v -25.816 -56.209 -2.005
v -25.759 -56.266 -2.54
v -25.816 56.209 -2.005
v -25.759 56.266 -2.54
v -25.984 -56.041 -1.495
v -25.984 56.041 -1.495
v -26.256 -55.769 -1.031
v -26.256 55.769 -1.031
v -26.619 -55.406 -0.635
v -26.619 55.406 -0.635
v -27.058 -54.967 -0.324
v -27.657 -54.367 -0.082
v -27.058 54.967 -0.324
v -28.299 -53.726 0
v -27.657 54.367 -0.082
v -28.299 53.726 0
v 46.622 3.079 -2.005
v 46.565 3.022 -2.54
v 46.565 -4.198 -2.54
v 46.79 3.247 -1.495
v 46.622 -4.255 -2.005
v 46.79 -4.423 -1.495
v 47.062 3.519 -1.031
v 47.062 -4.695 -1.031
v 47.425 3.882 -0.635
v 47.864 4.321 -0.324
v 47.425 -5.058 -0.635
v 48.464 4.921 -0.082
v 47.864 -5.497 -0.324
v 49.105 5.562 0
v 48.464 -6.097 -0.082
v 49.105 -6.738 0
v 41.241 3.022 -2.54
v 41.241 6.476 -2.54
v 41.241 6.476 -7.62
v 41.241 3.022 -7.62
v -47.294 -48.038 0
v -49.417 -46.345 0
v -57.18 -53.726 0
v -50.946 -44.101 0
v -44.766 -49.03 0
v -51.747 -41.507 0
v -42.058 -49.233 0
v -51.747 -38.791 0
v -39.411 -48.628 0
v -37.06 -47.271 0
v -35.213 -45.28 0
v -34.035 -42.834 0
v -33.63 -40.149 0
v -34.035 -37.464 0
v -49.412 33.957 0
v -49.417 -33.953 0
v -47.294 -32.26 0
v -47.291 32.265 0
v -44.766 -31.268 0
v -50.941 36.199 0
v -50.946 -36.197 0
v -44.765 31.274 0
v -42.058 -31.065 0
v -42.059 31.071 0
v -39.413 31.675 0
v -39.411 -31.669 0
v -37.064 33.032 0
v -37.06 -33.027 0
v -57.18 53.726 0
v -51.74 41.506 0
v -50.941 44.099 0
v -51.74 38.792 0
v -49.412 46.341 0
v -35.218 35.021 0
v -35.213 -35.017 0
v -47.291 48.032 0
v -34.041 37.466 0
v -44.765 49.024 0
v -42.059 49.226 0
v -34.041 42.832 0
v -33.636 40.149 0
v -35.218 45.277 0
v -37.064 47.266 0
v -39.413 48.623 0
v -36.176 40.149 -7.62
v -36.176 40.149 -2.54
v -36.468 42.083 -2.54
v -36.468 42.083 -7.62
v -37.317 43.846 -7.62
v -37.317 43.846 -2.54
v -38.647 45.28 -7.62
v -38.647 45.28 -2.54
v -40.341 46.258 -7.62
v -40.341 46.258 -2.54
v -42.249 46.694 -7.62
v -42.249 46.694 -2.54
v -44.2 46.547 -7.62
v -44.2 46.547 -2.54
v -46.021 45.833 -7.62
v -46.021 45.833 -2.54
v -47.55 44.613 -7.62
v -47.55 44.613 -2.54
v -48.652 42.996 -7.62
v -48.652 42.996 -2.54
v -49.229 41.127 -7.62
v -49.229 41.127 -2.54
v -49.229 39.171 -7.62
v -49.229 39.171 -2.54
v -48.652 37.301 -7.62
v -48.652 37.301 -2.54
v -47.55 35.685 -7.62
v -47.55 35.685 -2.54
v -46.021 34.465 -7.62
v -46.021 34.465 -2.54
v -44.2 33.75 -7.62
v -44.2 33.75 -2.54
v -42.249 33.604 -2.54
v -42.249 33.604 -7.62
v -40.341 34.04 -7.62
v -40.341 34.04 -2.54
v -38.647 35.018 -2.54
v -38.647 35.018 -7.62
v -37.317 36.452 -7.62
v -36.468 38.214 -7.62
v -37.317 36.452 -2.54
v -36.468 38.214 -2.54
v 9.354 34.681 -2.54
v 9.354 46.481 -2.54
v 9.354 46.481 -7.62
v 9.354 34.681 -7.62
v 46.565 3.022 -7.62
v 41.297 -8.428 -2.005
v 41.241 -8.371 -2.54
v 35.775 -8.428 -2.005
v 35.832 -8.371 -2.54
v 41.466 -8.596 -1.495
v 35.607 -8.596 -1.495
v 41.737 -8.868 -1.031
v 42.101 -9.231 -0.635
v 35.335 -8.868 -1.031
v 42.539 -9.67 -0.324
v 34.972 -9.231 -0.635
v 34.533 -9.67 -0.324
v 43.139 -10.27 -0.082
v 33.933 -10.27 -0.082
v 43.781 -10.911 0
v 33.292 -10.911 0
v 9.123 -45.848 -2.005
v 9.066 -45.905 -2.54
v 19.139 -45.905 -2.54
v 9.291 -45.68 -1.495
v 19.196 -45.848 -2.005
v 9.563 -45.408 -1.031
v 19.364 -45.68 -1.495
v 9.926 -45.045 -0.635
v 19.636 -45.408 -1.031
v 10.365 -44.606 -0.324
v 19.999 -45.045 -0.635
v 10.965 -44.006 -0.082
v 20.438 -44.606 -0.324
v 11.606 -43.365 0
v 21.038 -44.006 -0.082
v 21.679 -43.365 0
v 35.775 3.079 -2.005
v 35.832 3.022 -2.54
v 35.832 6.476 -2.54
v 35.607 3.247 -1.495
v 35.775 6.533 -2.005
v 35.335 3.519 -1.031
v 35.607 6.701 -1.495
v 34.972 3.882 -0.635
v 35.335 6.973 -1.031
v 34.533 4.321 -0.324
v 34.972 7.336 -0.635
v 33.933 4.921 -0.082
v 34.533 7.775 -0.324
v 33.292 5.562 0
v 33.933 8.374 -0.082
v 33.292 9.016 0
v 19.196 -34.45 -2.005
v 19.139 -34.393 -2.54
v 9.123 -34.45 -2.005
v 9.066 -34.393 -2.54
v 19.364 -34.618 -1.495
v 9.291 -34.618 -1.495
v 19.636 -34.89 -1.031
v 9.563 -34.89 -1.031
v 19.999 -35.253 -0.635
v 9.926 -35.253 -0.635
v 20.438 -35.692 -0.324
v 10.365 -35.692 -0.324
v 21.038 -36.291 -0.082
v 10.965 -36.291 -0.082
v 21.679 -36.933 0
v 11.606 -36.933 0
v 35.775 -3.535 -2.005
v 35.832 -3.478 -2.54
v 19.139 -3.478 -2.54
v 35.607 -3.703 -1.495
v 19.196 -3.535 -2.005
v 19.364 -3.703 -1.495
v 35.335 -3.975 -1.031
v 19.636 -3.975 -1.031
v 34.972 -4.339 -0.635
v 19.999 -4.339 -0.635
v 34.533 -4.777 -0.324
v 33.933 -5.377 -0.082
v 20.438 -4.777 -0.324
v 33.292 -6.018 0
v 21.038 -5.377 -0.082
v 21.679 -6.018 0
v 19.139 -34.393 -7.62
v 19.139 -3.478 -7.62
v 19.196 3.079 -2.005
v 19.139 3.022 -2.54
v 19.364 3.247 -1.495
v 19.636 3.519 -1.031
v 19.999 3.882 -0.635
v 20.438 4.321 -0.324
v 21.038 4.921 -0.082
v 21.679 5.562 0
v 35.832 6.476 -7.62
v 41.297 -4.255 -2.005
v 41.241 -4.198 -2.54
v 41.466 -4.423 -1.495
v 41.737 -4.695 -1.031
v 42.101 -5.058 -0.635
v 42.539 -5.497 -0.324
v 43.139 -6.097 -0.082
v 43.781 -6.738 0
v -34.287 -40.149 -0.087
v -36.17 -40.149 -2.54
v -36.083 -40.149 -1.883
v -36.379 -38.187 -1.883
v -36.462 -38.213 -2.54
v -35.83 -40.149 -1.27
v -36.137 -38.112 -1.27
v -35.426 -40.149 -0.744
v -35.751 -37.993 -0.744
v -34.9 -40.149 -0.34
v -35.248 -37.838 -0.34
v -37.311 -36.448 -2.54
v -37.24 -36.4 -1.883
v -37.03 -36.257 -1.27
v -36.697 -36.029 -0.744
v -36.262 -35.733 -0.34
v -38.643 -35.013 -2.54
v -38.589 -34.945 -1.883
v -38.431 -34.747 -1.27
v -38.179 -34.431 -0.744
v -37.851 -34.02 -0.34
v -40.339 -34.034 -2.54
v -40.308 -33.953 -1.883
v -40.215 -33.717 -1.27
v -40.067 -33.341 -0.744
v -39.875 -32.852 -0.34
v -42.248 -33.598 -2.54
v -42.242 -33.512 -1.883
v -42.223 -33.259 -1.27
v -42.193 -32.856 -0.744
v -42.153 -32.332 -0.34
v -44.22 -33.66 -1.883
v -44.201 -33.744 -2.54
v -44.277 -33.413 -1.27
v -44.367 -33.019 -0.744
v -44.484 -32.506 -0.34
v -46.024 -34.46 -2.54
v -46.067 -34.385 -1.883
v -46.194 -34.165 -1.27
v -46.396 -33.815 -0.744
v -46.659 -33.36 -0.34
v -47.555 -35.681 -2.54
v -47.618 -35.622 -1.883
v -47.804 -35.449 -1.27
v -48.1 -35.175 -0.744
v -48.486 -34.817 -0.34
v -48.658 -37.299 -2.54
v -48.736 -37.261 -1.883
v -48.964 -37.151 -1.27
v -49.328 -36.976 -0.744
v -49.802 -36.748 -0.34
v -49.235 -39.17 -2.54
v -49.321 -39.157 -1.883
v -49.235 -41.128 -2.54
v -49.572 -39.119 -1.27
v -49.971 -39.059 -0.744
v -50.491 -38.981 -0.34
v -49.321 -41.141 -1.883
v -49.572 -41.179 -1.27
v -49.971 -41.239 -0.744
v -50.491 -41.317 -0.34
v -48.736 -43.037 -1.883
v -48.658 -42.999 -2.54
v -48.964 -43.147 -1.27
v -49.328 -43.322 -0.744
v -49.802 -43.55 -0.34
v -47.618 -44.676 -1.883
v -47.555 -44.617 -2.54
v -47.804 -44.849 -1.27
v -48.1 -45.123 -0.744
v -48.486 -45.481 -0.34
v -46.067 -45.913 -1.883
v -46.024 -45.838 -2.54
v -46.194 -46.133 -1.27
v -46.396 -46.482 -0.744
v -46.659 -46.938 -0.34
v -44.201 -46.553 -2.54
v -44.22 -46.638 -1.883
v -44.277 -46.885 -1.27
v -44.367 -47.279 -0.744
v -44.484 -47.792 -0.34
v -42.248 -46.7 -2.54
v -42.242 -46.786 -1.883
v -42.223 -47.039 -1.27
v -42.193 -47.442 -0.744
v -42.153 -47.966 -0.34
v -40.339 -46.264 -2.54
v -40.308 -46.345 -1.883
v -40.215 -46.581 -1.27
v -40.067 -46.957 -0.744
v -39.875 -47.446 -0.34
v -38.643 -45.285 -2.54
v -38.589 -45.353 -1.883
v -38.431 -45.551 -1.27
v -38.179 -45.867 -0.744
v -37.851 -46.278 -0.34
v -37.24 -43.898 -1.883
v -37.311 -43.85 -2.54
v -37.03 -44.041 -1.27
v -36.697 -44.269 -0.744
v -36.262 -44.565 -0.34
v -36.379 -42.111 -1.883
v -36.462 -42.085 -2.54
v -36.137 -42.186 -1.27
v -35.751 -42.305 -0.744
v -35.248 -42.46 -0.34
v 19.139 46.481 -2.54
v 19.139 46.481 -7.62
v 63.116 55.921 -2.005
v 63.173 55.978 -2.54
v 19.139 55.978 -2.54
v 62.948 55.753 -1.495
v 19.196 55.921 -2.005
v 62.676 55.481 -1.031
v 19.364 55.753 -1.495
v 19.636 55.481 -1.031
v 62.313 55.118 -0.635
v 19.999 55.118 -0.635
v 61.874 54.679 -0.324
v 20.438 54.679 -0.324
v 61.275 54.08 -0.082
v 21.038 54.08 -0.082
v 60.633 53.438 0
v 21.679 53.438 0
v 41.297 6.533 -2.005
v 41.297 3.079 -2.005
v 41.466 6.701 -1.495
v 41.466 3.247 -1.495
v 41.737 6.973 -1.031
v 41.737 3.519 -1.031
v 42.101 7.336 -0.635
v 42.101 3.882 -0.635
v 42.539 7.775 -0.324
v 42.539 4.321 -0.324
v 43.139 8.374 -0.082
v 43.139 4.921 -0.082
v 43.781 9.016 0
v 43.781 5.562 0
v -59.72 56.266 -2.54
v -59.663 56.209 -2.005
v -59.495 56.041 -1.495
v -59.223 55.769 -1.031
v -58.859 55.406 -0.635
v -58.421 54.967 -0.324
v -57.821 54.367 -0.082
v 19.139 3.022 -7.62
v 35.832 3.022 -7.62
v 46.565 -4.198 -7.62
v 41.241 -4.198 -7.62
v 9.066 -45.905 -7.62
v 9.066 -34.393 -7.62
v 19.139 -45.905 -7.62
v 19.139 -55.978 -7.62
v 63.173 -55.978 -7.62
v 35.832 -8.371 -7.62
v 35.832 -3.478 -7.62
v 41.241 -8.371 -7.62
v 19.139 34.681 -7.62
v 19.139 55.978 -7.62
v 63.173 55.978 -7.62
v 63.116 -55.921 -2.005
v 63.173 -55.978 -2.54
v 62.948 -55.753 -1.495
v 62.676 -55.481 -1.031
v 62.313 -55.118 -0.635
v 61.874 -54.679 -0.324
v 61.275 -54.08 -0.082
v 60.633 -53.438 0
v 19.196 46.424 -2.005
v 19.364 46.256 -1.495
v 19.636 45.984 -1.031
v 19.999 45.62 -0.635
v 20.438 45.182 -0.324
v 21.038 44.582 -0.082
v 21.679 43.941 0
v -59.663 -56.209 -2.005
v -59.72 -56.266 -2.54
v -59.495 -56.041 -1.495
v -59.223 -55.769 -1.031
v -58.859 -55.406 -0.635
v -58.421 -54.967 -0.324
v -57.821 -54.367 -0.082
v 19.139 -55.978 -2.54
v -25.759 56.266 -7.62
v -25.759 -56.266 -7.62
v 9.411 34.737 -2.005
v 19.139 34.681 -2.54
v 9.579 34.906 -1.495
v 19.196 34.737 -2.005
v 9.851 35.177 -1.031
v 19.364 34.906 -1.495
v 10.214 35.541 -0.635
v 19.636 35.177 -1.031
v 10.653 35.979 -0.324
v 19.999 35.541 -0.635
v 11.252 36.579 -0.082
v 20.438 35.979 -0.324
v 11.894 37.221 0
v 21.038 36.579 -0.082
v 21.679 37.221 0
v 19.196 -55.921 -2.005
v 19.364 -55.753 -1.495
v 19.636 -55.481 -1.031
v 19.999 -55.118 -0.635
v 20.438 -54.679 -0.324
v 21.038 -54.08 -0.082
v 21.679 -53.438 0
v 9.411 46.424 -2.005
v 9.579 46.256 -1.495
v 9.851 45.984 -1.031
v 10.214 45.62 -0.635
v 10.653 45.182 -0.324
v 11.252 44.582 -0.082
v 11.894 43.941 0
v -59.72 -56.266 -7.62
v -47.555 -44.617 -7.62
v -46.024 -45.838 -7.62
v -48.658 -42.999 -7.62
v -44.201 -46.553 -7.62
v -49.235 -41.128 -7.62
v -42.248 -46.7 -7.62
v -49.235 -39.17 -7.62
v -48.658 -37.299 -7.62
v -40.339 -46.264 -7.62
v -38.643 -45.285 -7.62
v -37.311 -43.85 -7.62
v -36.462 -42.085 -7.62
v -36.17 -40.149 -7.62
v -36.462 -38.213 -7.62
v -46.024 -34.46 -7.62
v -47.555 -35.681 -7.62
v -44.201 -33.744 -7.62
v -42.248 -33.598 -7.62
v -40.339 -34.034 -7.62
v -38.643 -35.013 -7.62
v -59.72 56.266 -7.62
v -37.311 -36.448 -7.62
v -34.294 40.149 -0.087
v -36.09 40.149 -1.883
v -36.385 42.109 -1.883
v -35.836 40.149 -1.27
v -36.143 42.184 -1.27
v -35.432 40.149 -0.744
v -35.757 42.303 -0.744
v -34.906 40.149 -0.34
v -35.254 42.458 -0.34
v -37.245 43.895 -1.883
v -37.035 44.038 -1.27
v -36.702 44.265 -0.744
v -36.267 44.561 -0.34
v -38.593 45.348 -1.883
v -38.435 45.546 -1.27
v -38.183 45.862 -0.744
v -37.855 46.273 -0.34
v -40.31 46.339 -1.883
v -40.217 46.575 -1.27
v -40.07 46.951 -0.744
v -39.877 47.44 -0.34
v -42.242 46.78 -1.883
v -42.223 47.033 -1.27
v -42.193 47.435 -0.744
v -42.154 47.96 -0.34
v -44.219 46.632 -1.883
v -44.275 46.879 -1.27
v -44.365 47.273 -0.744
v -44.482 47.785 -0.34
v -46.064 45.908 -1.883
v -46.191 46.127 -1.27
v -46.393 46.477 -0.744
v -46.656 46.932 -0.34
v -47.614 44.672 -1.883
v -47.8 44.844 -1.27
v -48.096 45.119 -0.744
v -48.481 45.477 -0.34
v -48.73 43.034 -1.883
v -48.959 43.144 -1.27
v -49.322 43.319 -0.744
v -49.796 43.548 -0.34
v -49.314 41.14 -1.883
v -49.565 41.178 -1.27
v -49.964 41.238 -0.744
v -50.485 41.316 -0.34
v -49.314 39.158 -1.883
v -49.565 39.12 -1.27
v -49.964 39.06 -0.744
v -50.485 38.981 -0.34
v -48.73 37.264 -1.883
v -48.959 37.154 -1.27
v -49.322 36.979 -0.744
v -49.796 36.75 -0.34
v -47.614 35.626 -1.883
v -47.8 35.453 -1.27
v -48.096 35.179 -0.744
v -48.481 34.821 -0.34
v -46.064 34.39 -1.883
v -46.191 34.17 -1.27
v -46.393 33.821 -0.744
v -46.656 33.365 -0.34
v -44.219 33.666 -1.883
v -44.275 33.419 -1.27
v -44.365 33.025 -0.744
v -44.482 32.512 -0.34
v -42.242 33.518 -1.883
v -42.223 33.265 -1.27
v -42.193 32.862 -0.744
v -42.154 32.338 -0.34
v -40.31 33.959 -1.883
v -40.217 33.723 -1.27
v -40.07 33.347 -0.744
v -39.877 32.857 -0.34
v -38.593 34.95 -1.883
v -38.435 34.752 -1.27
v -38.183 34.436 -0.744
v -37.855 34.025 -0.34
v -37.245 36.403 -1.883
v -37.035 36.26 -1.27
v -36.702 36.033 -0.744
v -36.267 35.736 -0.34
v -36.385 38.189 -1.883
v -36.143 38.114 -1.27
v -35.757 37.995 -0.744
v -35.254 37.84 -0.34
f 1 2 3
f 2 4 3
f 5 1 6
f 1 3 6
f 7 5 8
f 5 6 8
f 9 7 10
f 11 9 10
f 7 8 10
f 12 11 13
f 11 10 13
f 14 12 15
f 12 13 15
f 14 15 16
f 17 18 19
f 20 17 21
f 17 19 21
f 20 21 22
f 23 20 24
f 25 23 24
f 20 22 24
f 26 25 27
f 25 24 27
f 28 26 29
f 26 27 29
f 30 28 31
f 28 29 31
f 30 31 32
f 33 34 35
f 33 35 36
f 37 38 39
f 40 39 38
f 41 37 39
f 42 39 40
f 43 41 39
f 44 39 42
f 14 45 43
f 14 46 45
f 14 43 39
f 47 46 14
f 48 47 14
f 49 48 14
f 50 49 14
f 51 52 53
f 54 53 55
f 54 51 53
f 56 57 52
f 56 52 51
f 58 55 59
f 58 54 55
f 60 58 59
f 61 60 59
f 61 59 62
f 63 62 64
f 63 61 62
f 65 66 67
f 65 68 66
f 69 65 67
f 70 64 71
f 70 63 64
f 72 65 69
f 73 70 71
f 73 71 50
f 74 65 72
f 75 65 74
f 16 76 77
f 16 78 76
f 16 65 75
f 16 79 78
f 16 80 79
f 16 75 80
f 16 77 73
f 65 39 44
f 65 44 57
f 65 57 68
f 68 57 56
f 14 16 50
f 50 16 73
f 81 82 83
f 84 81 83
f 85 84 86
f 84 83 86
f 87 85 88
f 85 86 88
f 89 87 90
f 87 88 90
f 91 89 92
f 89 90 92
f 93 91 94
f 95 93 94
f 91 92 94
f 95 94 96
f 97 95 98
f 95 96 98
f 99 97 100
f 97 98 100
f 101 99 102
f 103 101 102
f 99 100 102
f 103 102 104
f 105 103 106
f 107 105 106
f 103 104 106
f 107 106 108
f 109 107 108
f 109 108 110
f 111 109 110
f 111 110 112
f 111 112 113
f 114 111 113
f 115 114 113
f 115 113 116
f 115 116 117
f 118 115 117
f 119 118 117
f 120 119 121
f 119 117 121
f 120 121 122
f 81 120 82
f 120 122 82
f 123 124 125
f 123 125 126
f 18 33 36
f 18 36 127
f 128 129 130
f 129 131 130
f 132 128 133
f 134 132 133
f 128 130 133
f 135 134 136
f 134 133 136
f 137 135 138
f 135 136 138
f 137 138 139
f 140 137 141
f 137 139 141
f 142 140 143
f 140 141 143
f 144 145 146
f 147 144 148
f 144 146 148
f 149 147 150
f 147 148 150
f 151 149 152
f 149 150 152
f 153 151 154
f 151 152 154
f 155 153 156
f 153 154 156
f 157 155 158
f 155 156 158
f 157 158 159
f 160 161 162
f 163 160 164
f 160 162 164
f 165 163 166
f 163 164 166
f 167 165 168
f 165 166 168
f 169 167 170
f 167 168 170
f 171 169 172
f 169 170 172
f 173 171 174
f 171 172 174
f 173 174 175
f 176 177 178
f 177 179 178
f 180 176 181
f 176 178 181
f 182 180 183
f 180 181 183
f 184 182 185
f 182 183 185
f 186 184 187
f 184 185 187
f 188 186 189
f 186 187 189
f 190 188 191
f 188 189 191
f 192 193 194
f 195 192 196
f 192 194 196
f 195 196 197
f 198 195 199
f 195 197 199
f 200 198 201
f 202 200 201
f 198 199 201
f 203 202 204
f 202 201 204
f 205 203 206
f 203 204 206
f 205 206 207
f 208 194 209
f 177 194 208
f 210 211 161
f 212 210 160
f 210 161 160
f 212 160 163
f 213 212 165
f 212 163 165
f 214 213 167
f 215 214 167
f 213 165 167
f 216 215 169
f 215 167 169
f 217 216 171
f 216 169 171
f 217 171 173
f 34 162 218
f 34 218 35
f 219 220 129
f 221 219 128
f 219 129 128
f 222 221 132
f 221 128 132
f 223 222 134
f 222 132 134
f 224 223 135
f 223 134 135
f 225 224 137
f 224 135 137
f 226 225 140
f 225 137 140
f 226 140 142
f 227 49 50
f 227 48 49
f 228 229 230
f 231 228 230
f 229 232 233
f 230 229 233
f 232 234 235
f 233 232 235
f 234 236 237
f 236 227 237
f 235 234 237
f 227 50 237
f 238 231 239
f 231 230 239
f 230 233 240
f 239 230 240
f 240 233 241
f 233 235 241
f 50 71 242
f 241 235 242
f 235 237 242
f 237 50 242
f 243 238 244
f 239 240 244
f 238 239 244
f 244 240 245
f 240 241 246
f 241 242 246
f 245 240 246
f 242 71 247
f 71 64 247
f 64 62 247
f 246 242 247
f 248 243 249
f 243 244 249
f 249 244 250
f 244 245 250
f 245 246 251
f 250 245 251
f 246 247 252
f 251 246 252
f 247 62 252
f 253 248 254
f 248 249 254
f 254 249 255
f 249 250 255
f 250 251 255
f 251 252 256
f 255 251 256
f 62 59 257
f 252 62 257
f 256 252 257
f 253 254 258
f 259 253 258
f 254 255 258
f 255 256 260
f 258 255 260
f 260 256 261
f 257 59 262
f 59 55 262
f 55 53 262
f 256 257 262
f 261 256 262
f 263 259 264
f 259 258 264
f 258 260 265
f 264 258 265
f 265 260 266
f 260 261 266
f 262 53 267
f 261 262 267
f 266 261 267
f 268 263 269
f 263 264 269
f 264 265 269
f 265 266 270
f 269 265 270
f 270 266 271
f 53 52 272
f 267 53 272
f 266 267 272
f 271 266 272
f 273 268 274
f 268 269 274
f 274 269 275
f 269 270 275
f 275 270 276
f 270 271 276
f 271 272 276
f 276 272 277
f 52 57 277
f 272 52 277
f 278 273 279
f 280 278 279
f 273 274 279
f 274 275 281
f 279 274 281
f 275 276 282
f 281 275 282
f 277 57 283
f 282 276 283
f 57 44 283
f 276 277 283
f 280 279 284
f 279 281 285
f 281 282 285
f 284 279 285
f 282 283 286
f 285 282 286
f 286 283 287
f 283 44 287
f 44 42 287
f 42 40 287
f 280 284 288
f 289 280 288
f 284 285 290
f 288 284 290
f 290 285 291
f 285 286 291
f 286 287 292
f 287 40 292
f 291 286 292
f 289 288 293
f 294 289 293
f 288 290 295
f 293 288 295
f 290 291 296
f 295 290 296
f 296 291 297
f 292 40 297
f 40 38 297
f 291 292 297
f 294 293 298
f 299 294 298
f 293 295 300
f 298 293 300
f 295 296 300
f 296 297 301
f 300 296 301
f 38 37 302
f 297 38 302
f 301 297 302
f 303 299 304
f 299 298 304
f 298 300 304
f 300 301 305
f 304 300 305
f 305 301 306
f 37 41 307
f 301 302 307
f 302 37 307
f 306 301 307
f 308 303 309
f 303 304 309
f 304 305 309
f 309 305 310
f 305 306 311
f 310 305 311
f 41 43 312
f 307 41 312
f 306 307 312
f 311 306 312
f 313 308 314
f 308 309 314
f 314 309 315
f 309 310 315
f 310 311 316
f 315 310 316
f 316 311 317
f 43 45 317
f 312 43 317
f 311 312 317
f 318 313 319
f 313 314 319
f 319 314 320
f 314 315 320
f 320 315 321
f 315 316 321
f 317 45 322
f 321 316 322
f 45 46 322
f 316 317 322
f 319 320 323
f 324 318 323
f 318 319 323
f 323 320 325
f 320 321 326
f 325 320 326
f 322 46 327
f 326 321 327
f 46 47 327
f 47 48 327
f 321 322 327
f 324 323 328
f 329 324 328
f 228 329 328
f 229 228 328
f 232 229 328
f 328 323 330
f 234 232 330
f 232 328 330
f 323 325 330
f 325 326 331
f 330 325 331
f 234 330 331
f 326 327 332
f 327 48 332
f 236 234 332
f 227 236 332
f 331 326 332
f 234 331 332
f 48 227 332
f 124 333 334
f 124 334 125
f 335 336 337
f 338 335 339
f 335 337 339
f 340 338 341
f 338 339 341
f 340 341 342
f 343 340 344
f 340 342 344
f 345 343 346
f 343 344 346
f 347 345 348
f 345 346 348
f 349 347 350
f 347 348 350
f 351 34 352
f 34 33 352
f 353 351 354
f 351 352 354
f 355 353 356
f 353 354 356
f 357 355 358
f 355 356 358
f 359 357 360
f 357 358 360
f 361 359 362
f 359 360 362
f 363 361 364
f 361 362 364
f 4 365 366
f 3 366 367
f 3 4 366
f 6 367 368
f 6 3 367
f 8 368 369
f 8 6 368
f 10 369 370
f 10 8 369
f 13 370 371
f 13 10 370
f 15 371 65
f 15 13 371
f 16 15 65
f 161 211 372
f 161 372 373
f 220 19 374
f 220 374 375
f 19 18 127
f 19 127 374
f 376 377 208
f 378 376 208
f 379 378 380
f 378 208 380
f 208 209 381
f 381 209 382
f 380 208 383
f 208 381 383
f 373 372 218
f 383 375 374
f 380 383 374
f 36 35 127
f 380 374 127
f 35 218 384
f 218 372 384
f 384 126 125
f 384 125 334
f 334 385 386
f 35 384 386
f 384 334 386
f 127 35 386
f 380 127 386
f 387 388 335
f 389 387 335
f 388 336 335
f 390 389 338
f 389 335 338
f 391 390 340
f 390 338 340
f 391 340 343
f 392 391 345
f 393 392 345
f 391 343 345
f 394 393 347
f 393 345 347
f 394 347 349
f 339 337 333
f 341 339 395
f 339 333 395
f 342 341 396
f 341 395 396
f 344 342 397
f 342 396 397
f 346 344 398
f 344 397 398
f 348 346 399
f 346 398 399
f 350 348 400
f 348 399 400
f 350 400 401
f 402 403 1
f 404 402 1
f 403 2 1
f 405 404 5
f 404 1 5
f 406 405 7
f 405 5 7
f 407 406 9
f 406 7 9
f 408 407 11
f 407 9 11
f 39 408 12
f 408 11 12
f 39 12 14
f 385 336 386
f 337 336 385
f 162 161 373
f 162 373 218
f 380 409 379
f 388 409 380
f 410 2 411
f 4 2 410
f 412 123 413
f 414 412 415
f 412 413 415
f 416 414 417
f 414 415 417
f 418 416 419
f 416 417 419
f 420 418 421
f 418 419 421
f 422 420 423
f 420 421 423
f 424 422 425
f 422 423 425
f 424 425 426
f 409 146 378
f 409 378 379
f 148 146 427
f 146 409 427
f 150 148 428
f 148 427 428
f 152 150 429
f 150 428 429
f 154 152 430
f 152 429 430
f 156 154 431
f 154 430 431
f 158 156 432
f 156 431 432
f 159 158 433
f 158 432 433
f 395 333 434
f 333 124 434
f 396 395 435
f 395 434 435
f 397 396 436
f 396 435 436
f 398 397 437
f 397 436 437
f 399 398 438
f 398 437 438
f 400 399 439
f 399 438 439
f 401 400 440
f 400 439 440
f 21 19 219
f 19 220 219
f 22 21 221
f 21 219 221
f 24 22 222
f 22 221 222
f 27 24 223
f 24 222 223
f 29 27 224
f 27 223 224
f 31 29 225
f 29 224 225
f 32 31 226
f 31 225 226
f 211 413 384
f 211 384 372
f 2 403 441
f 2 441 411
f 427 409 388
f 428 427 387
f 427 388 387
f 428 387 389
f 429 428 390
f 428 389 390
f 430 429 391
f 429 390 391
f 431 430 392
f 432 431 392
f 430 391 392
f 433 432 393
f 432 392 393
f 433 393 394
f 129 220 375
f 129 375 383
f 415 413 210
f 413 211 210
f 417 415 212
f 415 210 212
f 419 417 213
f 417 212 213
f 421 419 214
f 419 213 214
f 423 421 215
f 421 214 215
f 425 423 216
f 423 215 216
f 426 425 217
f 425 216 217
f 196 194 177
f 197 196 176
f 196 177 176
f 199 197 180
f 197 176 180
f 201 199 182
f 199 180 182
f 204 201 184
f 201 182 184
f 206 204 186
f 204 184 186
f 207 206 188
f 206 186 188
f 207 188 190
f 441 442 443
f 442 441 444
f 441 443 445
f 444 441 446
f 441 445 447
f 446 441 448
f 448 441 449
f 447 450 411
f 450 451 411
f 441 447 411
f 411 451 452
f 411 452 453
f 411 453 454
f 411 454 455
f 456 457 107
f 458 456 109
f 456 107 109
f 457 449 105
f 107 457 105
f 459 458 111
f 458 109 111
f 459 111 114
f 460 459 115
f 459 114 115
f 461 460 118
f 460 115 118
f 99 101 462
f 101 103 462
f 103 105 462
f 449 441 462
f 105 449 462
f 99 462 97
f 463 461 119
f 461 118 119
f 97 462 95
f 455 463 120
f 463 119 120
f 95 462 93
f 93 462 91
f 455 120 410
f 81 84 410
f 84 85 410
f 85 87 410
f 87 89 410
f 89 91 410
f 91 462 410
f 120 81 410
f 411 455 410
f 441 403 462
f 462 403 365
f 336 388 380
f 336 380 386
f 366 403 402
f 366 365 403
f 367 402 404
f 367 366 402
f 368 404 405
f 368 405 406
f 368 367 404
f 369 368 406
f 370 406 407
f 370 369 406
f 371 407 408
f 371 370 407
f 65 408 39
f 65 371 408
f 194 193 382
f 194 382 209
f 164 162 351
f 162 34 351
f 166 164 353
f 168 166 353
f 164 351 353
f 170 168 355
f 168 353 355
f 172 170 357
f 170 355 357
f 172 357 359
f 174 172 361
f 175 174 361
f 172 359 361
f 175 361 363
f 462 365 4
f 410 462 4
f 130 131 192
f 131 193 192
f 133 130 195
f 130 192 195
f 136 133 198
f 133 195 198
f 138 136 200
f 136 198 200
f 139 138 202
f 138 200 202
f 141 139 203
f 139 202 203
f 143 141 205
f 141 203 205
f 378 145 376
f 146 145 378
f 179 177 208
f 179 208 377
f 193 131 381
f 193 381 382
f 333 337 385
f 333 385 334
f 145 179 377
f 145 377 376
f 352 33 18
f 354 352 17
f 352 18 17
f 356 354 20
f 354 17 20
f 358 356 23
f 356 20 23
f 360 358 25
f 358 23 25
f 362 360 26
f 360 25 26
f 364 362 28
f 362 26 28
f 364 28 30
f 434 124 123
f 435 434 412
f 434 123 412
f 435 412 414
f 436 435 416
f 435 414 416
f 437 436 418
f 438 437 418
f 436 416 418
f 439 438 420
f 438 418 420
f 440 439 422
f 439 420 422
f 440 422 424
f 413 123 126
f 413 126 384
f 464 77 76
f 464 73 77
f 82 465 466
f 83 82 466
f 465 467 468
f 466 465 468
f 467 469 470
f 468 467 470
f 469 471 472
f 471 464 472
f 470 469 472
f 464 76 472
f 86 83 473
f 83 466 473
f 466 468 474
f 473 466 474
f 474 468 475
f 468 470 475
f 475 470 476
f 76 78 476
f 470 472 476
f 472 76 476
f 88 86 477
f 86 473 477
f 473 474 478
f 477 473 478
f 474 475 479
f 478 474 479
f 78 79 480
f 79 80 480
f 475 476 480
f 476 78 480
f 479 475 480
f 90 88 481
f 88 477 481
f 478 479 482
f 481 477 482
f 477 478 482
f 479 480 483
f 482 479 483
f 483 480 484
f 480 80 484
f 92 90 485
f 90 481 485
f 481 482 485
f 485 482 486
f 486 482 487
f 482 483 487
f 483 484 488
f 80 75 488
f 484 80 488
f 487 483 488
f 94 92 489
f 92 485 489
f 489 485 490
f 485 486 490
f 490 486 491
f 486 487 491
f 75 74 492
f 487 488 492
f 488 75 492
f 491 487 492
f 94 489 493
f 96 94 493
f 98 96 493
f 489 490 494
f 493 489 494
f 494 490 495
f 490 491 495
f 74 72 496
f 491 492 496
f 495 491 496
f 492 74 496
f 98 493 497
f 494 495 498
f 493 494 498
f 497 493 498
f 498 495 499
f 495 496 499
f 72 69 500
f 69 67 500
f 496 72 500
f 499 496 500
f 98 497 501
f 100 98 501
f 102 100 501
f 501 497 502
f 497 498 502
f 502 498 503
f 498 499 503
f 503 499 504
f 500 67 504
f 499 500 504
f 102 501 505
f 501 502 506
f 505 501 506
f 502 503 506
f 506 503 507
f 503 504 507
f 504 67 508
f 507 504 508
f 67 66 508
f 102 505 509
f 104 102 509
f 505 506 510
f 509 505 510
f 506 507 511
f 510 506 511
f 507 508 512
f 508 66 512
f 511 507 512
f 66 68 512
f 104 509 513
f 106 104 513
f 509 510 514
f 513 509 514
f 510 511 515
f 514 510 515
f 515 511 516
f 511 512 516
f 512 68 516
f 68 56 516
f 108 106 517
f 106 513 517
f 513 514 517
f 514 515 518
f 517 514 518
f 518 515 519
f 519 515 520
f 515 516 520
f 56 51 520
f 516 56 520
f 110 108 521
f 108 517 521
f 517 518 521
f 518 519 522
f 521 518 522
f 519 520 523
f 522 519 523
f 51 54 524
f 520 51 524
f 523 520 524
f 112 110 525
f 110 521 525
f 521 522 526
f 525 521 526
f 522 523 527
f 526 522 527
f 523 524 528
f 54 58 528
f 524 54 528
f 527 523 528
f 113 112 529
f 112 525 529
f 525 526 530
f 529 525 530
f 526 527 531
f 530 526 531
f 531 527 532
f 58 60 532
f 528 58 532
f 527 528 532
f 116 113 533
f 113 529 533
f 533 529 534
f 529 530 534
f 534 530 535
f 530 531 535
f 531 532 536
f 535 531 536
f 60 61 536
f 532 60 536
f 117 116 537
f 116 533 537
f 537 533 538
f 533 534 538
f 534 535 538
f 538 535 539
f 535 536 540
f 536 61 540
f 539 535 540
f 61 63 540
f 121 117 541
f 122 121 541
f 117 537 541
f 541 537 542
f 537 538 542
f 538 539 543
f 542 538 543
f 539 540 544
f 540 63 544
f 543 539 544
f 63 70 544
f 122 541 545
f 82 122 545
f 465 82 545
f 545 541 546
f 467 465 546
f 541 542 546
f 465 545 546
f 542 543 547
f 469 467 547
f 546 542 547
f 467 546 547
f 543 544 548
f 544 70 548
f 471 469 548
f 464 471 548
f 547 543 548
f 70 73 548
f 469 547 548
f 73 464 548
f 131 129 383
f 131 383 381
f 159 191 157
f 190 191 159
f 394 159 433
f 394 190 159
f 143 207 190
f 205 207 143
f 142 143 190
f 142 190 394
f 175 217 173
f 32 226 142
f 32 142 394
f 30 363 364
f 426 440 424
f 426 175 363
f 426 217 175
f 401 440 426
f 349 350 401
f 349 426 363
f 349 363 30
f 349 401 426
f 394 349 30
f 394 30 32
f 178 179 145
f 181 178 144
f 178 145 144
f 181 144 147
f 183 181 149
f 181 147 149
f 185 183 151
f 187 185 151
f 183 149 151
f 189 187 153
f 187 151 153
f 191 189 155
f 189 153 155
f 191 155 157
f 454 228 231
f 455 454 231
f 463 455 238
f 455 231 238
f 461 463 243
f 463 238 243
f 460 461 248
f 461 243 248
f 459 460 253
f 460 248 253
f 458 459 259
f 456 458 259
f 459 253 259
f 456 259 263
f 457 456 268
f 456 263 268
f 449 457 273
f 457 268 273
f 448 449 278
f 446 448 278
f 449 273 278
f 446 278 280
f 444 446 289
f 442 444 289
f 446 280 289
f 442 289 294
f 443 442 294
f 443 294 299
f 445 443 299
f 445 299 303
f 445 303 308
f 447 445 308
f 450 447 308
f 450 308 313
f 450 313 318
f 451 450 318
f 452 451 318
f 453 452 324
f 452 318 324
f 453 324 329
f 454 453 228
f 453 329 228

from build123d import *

# Parameters (mm, degrees)
F0_W     = 33.961078
F0_H     = 112.53205
F0_R     = 6.569287
F0_R_2   = 6.562981
F1_DEPTH = 7.62
F2_R     = 2.54
F3_R     = 2.54


with BuildPart() as f1:
    # F0 (on Top) → F1 (new body)
    with BuildSketch(Plane.XY):
        with Locations((-42.739156, 0)):
            Rectangle(F0_W, F0_H)
        with Locations((-42.739156, -40.148903)):
            Circle(F0_R, mode=Mode.SUBTRACT)
        with Locations((-42.739156, 40.148903)):
            Circle(F0_R_2, mode=Mode.SUBTRACT)
        Polygon((63.173369, 55.97822), (19.139083, 55.97822), (19.139083, 46.48063), (9.353687, 46.48063), (9.353687, 34.680594), (19.139081, 34.680594), (19.139082, 3.02196), (35.831816, 3.021961), (35.831816, 6.47563), (41.240517, 6.47563), (41.240517, 3.021961), (46.564922, 3.021961), (46.564922, -2.327136), (46.564922, -4.197873), (41.240517, -4.197873), (41.240517, -8.371057), (35.831816, -8.371057), (35.831816, -3.478359), (19.139082, -3.478359), (19.139083, -34.392789), (9.065881, -34.392789), (9.065881, -45.90502), (19.139083, -45.90502), (19.139083, -55.97822), (63.173369, -55.97822), align=None)
    extrude(amount=-F1_DEPTH)

    # F2
    f2_edges = [f1.edges().sort_by_distance(p)[0] for p in [
        (41.156226, 55.97822, 0),
        (19.139083, 51.229425, 0),
        (14.246385, 46.48063, 0),
        (9.353687, 40.580612, 0),
        (14.246384, 34.680594, 0),
        (19.139082, 18.851277, 0),
        (27.485449, 3.021961, 0),
        (35.831816, 4.748795, 0),
        (38.536167, 6.47563, 0),
        (41.240517, 4.748795, 0),
        (43.902719, 3.021961, 0),
        (46.564922, -0.587956, 0),
        (43.902719, -4.197873, 0),
        (41.240517, -6.284465, 0),
        (38.536167, -8.371057, 0),
        (35.831816, -5.924708, 0),
        (27.485449, -3.478359, 0),
        (19.139083, -18.935574, 0),
        (14.102482, -34.392789, 0),
        (9.065881, -40.148905, 0),
        (14.102482, -45.90502, 0),
        (19.139083, -50.94162, 0),
        (41.156226, -55.97822, 0),
        (63.173369, 0, 0),
    ]]
    fillet(f2_edges, radius=F2_R)

    # F3
    f3_edges = [f1.edges().sort_by_distance(p)[0] for p in [
        (-42.739156, 56.266025, 0),
        (-59.719695, 0, 0),
        (-42.739156, -56.266025, 0),
        (-25.758617, 0, 0),
        (-49.308443, -40.148903, 0),
        (-49.302137, 40.148903, 0),
    ]]
    fillet(f3_edges, radius=F3_R)


solid = f1.part
